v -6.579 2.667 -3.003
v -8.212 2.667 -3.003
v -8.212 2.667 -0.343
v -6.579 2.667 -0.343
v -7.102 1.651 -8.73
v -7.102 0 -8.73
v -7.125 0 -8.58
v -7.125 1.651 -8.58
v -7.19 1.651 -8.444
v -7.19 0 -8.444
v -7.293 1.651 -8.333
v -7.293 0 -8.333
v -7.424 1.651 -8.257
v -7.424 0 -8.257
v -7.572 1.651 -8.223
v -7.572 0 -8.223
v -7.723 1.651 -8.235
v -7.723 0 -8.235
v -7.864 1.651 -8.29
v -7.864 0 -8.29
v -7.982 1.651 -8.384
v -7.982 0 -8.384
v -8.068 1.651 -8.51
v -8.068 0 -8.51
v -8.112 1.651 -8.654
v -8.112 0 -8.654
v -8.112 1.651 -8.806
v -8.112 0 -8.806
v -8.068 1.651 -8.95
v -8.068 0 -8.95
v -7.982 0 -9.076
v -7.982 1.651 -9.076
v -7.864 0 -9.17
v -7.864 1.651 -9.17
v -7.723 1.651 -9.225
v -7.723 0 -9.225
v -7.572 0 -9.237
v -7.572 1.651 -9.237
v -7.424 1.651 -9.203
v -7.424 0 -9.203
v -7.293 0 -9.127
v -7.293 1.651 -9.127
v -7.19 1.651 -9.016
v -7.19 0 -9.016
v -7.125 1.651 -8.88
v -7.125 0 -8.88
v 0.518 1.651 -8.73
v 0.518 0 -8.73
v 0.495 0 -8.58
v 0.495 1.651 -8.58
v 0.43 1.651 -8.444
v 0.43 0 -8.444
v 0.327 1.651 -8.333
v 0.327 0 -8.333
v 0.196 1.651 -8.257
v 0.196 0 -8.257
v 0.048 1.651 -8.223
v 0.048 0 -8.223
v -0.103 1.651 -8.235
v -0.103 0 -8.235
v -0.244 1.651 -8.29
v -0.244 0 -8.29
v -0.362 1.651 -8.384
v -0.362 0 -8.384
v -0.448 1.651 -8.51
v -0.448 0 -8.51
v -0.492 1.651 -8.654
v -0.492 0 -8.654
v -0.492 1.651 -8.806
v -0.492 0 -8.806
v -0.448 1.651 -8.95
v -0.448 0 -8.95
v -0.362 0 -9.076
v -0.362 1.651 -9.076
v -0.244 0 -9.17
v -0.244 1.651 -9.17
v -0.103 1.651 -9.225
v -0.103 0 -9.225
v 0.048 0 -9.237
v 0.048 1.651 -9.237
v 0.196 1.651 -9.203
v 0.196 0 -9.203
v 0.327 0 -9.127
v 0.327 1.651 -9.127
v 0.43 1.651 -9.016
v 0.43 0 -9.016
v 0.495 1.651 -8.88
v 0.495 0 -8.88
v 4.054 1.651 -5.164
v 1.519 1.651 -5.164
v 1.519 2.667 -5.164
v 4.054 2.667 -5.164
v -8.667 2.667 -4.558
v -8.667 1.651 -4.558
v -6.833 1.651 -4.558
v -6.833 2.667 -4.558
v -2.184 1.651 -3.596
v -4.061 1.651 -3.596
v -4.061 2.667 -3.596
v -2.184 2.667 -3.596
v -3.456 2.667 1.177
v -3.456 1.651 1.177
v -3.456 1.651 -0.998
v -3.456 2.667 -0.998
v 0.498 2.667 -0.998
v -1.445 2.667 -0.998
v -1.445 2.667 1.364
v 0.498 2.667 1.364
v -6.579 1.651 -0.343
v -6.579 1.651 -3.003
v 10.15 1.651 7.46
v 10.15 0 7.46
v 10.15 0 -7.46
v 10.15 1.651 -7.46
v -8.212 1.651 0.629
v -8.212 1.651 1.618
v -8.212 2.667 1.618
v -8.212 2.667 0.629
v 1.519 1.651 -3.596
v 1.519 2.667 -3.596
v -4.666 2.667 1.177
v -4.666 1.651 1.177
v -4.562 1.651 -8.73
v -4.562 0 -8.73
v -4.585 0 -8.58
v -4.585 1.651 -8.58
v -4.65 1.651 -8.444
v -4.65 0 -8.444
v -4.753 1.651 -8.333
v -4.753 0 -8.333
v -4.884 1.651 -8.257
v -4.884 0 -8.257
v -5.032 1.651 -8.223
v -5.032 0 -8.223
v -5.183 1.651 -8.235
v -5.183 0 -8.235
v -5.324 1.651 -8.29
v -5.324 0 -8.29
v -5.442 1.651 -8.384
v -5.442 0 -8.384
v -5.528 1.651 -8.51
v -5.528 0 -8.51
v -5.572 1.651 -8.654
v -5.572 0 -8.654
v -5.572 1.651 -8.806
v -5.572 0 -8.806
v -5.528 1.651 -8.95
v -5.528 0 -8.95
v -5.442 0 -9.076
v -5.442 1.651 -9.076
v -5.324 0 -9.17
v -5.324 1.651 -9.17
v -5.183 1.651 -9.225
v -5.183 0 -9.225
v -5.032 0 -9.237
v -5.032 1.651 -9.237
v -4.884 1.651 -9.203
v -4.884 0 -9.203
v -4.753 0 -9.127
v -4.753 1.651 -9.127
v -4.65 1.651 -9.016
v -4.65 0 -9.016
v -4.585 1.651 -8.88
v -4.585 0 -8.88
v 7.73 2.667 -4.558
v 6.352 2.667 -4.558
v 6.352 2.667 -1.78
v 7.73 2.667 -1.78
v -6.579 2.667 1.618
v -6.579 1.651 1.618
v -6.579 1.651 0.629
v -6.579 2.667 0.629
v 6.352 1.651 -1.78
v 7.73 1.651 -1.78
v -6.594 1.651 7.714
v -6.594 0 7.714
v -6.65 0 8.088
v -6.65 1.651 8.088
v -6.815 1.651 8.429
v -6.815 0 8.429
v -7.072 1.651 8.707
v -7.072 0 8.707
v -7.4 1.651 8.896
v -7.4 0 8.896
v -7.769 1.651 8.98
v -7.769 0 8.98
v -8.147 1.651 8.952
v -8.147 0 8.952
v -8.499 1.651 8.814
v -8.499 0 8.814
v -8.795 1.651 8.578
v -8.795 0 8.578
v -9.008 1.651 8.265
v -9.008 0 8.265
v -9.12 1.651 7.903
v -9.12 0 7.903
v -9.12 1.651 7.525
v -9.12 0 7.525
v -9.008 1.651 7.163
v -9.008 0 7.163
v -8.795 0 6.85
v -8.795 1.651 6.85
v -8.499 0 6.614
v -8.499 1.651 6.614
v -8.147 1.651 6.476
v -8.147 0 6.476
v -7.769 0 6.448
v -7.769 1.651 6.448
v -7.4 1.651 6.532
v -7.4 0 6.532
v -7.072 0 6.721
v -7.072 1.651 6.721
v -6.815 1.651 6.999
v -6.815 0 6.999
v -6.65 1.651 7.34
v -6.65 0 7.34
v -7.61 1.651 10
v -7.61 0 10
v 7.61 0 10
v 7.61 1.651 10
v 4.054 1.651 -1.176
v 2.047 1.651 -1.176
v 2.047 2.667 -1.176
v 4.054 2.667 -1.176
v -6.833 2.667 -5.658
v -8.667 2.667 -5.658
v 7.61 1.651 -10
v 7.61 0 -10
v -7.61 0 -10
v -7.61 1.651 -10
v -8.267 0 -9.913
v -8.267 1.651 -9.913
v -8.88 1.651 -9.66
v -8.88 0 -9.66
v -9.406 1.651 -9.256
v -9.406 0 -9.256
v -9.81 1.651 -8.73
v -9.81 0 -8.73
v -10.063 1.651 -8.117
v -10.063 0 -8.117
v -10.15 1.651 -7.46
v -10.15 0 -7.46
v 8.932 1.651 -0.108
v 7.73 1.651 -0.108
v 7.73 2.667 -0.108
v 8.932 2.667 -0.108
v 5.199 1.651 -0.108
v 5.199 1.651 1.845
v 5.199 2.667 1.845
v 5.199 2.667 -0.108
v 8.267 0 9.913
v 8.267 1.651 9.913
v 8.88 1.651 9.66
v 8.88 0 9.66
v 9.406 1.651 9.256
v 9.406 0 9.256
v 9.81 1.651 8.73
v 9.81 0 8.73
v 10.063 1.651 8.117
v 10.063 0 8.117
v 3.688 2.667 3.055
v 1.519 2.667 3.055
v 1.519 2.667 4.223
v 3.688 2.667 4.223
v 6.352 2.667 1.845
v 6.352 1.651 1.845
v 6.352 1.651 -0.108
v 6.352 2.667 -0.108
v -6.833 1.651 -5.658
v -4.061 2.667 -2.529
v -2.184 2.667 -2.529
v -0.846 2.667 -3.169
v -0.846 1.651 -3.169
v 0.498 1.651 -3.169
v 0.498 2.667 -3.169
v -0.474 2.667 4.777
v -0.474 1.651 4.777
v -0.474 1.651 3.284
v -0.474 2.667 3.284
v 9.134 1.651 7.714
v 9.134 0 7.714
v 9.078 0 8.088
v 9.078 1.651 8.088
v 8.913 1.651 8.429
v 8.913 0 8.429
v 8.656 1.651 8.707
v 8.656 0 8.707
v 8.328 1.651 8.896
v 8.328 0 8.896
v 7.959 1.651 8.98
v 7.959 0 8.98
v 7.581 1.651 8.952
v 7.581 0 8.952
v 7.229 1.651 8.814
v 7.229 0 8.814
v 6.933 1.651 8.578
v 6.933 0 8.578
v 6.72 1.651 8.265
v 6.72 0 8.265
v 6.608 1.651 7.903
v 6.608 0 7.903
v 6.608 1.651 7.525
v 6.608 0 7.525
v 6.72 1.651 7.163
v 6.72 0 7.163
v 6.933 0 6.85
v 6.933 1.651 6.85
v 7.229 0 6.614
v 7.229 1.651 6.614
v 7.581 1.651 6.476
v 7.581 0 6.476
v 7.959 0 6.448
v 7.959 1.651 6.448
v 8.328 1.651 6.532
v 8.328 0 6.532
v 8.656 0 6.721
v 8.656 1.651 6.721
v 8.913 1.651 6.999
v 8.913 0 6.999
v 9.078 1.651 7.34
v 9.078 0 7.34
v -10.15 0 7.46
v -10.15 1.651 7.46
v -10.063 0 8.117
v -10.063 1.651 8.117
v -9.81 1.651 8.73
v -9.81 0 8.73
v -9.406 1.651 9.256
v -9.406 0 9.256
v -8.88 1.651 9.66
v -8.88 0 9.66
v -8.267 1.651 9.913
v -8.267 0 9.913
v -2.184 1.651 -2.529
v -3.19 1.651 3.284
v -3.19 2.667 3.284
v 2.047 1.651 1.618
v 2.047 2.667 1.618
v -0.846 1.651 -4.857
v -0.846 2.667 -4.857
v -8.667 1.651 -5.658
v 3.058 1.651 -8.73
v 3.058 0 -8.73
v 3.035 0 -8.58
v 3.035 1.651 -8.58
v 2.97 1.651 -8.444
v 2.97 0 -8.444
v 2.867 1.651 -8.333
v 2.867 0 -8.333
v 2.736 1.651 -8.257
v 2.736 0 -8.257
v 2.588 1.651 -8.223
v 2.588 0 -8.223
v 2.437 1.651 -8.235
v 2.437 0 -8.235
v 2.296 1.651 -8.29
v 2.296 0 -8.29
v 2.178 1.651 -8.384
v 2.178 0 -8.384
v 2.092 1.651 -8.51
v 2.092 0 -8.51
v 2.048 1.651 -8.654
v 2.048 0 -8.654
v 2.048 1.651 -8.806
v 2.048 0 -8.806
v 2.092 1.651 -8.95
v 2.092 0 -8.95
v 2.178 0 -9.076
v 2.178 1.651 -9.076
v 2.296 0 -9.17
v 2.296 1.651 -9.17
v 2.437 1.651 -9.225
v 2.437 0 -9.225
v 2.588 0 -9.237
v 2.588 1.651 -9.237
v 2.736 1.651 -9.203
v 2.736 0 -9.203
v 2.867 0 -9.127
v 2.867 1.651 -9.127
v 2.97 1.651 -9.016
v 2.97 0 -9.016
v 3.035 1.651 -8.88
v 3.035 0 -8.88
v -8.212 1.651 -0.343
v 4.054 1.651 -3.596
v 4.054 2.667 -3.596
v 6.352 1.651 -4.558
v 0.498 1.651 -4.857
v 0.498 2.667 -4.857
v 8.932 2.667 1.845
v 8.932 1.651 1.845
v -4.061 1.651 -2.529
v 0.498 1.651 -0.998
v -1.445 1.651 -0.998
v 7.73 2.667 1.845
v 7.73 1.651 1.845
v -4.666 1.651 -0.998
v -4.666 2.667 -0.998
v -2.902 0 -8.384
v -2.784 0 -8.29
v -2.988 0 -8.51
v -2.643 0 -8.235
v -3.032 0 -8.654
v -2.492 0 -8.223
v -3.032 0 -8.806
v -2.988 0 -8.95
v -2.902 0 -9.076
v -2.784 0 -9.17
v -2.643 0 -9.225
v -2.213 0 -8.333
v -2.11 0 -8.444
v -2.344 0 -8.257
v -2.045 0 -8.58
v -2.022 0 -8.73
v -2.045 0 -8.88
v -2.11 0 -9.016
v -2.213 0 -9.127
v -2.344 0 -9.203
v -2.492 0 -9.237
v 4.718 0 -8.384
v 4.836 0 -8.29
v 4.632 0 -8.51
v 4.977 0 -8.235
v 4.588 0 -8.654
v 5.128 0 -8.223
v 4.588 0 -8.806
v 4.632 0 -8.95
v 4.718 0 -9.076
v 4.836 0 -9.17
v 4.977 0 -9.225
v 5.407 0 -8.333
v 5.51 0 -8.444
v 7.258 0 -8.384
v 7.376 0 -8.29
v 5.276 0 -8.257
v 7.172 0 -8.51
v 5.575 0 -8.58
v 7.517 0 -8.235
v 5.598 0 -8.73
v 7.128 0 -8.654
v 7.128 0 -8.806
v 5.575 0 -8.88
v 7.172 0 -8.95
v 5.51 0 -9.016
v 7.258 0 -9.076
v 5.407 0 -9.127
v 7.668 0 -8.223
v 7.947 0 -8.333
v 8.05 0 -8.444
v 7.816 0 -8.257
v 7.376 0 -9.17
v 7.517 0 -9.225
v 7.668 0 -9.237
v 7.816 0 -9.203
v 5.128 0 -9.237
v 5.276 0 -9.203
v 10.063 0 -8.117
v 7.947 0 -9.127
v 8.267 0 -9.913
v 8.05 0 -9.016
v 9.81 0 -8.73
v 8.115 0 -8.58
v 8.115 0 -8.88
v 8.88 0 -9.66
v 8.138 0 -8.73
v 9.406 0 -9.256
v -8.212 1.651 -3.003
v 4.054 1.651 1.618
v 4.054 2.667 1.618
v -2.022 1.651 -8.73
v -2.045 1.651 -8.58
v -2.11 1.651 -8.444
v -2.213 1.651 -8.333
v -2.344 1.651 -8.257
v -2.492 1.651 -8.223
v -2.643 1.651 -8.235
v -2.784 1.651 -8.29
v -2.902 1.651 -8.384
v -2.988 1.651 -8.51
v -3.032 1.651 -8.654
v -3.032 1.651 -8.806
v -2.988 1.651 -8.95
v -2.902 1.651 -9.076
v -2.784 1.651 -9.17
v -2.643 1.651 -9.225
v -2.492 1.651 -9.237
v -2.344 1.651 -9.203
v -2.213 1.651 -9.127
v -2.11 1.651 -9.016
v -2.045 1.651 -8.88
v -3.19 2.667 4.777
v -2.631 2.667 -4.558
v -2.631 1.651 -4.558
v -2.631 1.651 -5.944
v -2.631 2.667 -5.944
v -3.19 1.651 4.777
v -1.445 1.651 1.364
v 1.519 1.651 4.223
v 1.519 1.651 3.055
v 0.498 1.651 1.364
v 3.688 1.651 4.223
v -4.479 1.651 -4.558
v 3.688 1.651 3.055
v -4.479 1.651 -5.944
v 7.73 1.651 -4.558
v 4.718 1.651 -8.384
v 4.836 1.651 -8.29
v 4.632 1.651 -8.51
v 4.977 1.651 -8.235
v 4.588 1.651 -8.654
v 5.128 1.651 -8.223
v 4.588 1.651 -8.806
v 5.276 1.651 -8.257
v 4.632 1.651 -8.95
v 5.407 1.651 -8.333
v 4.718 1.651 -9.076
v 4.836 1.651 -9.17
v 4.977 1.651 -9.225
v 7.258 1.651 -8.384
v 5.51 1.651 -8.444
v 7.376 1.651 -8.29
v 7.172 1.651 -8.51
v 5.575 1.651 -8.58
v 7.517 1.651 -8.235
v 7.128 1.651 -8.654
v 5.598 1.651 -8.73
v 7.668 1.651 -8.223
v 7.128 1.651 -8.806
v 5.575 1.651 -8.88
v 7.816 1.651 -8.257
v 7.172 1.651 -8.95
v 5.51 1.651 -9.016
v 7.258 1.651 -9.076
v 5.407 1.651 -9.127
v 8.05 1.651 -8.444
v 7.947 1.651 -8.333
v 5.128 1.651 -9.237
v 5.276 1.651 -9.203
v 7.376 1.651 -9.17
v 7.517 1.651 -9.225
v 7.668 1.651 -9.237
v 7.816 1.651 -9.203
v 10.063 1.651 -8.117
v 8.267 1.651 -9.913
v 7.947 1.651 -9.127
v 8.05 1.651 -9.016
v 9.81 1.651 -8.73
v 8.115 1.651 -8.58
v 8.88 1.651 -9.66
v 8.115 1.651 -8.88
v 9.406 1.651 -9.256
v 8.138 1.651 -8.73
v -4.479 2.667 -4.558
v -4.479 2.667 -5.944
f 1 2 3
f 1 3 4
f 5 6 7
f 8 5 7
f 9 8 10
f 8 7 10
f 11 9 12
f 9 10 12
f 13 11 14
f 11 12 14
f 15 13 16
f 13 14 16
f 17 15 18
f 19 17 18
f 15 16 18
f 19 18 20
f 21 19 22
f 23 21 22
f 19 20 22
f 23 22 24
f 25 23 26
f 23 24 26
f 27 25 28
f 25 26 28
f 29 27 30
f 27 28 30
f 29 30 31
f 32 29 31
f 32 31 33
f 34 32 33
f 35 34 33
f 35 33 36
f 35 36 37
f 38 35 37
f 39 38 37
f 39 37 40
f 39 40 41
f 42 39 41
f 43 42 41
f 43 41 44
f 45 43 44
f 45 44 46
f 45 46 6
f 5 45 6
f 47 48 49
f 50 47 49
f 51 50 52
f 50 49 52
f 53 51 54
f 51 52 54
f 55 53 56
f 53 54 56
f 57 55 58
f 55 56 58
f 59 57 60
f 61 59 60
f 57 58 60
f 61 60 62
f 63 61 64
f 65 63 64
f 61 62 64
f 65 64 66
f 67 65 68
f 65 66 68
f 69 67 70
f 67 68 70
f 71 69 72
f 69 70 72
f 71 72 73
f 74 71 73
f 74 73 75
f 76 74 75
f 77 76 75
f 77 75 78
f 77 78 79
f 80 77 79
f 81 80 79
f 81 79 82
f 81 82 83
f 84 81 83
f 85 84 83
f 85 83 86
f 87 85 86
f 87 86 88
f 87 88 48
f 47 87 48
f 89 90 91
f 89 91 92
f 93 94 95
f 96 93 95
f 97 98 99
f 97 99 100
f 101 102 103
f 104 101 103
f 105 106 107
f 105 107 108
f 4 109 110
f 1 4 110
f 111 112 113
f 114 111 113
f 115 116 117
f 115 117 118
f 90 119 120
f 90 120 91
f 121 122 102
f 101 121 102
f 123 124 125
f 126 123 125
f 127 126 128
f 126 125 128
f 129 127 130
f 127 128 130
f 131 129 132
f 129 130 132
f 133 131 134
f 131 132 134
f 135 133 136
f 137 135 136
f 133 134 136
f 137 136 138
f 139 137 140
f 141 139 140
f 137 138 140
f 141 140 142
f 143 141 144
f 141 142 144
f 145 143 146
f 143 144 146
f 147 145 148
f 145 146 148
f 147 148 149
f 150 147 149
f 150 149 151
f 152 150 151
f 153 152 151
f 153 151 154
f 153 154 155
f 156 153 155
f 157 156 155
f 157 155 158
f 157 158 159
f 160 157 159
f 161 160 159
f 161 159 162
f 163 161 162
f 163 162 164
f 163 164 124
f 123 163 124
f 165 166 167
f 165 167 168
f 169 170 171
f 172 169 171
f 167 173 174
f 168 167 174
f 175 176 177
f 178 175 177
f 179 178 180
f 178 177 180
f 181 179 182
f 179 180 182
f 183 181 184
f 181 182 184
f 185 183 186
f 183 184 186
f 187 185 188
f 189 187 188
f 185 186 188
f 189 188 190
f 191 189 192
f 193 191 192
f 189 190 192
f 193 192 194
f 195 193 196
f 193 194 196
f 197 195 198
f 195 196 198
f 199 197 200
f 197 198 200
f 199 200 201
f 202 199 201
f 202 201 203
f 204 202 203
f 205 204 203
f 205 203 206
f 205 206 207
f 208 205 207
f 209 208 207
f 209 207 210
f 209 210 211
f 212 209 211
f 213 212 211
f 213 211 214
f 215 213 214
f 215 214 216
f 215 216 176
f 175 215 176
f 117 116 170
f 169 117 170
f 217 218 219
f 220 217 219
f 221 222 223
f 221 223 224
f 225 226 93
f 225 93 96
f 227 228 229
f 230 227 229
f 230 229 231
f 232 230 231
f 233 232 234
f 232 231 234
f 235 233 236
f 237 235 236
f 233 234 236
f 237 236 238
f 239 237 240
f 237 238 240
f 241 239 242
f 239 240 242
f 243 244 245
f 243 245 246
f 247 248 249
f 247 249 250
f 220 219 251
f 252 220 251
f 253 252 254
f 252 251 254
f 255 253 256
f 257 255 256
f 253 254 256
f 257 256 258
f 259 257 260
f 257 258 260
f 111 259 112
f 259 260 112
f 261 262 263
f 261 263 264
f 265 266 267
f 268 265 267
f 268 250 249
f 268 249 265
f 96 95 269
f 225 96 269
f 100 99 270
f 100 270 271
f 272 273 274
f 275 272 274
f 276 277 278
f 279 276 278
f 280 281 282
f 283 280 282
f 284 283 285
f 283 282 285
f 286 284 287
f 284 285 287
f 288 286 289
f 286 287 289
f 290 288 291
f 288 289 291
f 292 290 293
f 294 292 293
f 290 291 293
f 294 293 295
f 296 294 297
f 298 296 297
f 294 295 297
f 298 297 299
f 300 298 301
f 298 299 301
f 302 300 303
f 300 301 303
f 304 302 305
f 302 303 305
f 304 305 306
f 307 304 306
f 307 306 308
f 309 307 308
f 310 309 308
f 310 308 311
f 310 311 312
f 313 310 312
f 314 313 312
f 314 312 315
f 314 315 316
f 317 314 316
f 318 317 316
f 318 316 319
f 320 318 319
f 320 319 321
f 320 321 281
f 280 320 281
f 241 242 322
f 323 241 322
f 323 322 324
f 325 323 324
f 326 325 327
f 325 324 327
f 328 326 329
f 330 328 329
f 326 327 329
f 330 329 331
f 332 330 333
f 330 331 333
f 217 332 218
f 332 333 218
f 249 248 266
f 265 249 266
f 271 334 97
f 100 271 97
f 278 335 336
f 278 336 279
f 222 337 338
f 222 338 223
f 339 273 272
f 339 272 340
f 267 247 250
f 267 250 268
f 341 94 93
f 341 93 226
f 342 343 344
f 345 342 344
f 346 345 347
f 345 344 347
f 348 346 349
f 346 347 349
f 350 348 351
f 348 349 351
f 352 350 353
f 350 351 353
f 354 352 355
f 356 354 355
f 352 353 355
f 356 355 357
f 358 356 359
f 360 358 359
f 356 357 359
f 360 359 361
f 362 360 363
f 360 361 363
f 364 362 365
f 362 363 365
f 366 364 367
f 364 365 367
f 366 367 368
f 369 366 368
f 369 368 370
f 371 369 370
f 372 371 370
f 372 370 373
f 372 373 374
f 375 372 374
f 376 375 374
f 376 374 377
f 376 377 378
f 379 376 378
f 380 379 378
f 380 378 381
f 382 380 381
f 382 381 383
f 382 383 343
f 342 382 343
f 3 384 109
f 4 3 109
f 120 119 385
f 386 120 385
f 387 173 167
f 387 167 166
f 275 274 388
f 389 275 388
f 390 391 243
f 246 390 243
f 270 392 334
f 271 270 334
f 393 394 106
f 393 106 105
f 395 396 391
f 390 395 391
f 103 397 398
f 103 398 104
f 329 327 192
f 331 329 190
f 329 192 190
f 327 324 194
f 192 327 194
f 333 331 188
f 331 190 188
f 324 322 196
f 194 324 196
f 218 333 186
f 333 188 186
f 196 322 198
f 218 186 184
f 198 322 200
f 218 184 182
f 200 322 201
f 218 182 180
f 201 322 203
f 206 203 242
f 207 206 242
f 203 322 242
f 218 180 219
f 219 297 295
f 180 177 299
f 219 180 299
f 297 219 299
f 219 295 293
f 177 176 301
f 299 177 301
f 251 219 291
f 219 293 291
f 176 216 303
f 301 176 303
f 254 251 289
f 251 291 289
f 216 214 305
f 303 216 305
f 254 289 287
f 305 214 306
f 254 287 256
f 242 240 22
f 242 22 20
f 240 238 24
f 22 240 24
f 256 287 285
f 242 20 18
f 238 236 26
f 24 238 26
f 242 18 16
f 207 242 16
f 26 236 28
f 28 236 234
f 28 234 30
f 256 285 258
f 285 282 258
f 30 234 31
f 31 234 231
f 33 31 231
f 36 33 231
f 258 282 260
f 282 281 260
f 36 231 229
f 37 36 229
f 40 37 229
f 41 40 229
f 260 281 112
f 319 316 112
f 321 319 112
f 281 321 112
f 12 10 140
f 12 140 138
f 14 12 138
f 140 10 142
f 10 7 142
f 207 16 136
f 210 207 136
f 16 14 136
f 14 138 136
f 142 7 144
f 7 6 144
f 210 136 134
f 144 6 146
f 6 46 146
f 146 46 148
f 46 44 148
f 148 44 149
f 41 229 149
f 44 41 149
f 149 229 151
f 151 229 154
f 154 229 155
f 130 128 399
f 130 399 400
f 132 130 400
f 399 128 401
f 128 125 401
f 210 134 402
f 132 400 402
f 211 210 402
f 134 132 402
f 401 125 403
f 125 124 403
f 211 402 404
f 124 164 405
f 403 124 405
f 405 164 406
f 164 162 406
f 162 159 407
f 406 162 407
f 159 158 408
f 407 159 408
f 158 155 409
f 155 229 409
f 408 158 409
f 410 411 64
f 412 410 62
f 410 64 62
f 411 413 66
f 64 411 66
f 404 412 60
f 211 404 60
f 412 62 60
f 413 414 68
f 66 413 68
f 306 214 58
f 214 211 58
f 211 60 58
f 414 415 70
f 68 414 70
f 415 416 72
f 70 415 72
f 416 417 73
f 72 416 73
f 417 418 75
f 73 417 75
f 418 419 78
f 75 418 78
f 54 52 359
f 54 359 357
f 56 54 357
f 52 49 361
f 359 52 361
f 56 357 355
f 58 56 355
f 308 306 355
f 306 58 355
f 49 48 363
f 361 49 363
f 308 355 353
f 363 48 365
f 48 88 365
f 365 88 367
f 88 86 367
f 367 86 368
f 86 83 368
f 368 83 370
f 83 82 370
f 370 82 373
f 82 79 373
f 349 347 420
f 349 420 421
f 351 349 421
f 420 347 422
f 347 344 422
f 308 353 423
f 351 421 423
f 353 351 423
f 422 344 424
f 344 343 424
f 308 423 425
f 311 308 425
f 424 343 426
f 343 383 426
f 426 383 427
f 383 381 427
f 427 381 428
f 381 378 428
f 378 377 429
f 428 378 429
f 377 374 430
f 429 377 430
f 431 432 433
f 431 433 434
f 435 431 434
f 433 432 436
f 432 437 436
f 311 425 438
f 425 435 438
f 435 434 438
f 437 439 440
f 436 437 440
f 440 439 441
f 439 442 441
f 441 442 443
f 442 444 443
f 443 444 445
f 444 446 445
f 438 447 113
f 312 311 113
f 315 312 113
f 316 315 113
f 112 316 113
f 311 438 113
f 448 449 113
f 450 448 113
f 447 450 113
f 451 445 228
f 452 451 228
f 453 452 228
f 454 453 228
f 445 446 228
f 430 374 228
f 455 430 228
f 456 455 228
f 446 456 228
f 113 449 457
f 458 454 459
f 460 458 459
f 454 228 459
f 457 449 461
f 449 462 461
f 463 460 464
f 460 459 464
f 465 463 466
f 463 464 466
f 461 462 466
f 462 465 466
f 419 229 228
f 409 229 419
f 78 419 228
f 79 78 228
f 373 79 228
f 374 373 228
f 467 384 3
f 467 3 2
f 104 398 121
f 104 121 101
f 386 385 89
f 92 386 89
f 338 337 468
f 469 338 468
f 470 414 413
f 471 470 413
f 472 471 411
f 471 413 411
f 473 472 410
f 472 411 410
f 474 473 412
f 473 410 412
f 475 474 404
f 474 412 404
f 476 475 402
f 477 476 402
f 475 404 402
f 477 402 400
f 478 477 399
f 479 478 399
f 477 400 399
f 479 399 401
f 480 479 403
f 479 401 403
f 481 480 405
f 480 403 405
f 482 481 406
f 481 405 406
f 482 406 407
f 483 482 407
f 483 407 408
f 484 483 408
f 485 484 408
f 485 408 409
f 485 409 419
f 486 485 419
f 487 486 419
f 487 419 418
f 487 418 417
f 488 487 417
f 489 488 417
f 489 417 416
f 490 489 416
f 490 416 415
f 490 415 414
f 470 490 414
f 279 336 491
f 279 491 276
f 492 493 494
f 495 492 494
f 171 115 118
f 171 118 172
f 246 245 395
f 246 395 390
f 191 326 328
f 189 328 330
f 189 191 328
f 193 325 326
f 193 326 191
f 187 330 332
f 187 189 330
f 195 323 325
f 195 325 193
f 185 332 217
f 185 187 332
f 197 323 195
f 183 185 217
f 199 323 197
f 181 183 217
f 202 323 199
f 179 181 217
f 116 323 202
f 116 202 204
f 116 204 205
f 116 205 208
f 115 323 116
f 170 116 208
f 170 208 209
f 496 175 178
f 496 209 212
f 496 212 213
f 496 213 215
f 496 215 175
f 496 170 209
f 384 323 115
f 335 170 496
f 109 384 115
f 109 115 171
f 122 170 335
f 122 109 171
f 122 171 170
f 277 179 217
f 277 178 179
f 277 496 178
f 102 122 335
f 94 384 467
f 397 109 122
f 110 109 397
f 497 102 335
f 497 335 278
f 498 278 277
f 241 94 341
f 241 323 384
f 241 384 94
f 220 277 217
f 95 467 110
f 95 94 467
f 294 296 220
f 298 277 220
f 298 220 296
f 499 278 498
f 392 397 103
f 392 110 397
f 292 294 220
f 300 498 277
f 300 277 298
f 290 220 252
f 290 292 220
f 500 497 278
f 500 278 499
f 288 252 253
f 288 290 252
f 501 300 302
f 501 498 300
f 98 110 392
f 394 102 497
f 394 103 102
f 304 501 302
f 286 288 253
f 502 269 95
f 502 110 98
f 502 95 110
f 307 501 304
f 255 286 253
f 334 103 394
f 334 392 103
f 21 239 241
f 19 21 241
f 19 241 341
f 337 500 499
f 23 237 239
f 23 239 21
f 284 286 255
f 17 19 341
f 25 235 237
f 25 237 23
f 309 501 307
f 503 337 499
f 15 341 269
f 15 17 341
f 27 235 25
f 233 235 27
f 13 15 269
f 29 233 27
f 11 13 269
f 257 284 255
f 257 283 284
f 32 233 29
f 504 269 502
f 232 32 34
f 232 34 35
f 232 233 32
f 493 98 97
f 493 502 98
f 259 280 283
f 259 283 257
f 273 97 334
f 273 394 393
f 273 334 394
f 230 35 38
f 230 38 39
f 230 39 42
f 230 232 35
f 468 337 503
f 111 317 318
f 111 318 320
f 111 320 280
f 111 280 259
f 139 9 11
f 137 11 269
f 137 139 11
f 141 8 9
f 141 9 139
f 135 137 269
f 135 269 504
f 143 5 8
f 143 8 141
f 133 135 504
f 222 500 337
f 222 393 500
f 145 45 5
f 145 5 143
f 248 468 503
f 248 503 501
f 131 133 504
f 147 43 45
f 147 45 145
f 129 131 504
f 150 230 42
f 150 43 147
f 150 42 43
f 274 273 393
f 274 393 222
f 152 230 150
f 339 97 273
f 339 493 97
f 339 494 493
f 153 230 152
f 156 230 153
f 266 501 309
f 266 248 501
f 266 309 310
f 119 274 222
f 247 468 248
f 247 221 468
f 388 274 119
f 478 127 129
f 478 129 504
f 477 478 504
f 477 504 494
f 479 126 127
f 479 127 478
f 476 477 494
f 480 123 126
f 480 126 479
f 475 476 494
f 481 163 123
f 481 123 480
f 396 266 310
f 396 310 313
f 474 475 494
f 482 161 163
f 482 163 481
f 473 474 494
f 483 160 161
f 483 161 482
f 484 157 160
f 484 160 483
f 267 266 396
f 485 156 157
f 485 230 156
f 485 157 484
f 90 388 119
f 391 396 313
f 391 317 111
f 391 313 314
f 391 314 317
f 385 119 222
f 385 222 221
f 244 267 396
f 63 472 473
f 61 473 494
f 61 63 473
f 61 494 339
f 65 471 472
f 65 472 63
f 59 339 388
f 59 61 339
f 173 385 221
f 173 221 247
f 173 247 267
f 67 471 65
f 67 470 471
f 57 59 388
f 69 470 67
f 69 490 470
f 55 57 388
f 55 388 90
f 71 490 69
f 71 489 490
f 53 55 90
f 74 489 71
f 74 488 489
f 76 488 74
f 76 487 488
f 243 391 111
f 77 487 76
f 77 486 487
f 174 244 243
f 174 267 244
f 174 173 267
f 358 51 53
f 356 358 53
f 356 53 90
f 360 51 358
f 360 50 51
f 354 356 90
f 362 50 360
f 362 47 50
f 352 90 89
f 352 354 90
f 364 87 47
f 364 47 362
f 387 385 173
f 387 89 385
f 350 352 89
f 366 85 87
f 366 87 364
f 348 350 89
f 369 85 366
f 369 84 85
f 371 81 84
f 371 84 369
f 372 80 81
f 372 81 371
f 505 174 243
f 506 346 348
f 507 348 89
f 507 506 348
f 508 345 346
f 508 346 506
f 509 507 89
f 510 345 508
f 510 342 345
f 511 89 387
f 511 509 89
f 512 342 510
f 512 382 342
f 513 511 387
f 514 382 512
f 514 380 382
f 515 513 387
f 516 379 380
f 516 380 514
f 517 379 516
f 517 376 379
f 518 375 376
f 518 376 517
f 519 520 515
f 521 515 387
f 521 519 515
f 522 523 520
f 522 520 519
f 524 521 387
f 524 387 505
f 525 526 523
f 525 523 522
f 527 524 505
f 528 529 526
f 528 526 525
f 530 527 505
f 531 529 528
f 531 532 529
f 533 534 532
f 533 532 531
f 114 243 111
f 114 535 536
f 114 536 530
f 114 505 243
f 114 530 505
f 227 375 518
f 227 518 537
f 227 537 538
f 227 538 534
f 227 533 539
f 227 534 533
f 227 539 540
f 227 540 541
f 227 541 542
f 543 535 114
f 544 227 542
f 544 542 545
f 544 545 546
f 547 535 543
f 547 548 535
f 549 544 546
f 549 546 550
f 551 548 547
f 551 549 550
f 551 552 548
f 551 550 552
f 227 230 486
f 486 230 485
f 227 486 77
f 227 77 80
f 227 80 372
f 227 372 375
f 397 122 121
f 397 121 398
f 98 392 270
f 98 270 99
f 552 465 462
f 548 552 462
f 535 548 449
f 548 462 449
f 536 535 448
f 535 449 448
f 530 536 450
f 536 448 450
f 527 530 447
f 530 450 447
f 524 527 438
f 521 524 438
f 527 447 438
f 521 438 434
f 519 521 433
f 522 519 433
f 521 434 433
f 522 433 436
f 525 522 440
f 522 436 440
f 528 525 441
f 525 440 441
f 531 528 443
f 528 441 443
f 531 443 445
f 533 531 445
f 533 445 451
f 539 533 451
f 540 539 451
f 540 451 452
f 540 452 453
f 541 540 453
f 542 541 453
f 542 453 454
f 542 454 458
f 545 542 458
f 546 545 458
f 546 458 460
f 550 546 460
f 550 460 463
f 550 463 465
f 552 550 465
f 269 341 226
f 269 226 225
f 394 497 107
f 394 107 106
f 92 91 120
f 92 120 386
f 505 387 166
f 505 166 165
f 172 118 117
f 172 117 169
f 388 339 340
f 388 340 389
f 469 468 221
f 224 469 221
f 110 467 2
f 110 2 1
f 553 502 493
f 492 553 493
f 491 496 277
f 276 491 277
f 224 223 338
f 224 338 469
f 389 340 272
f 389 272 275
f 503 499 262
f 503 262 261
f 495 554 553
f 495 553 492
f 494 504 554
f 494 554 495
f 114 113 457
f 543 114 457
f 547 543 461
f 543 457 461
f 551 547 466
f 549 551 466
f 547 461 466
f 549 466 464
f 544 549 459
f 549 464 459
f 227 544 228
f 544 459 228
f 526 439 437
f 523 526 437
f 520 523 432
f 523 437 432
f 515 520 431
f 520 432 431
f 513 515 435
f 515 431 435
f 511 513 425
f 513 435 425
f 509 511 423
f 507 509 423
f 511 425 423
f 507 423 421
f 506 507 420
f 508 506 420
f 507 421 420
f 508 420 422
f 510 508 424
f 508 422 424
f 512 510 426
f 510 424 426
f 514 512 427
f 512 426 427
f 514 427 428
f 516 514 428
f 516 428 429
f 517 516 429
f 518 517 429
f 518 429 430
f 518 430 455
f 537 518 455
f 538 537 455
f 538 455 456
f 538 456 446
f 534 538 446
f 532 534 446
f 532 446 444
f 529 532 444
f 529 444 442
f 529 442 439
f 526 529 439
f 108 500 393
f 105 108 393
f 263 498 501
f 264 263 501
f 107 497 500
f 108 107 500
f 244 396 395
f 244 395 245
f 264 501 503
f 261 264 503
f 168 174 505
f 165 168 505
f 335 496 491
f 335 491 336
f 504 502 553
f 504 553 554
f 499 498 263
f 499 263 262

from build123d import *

# Parameters (mm, degrees)
PCB_DEPTH          = 1.651
SKETCH2_R          = 1.27
SKETCH2_R_2        = 0.508
CUT_EXTRUDE1_DEPTH = 2.651
SKETCH3_W          = 1.9431
SKETCH3_H          = 2.3622
SKETCH3_W_2        = 2.0066
SKETCH3_H_2        = 2.794
SKETCH3_W_3        = 2.16822249
SKETCH3_H_3        = 1.167787324
SKETCH3_W_4        = 2.716171955
SKETCH3_H_4        = 1.493517176
SKETCH3_W_5        = 1.209663862
SKETCH3_H_5        = 2.17508788
SKETCH3_W_6        = 1.633321627
SKETCH3_H_6        = 2.659890245
SKETCH3_W_7        = 1.834361491
SKETCH3_H_7        = 1.100221283
SKETCH3_W_8        = 1.848311781
SKETCH3_H_8        = 1.38602823
SKETCH3_W_9        = 1.877433771
SKETCH3_H_9        = 1.066217503
SKETCH3_H_10       = 0.988618516
SKETCH3_W_10       = 1.152895283
SKETCH3_H_11       = 1.952725423
SKETCH3_W_11       = 1.201658639
SKETCH3_W_12       = 1.378437796
SKETCH3_H_12       = 2.778082819
SKETCH3_W_13       = 2.534678464
SKETCH3_H_13       = 1.568516227
SKETCH3_W_14       = 1.344087022
SKETCH3_H_14       = 1.688234225
COMPONENTS_DEPTH   = 1.016


with BuildPart() as part:
    # Sketch1 → pcb (new body)
    with BuildSketch(Plane(origin=(0, 0, 0), x_dir=(1, 0, 0), z_dir=(0, 1, 0))):
        with BuildLine():
            Line((-7.61, -10), (7.61, -10))
            ThreePointArc((7.61, -10), (9.406051224, -9.256051224), (10.15, -7.46))
            Line((10.15, -7.46), (10.15, 7.46))
            ThreePointArc((10.15, 7.46), (9.406051224, 9.256051224), (7.61, 10))
            Line((7.61, 10), (-7.61, 10))
            ThreePointArc((-7.61, 10), (-9.406051224, 9.256051224), (-10.15, 7.46))
            Line((-10.15, 7.46), (-10.15, -7.46))
            ThreePointArc((-10.15, -7.46), (-9.406051224, -9.256051224), (-7.61, -10))
        make_face()
    extrude(amount=PCB_DEPTH)

    # Sketch2 → Cut-Extrude1 (cut, through all)
    with BuildSketch(Plane.XZ):
        with Locations((-7.864, 7.714)):
            Circle(SKETCH2_R)
        with Locations((7.864, 7.714)):
            Circle(SKETCH2_R)
        with Locations((-7.61, -8.73)):
            Circle(SKETCH2_R_2)
        with Locations((-5.07, -8.73)):
            Circle(SKETCH2_R_2)
        with Locations((-2.53, -8.73)):
            Circle(SKETCH2_R_2)
        with Locations((0.01, -8.73)):
            Circle(SKETCH2_R_2)
        with Locations((2.55, -8.73)):
            Circle(SKETCH2_R_2)
        with Locations((5.09, -8.73)):
            Circle(SKETCH2_R_2)
        with Locations((7.63, -8.73)):
            Circle(SKETCH2_R_2)
    extrude(amount=-CUT_EXTRUDE1_DEPTH, mode=Mode.SUBTRACT)

    # Sketch3 → components (add)
    with BuildSketch(Plane(origin=(0, 1.651, 0), x_dir=(1, 0, 0), z_dir=(0, 1, 0))):
        with Locations((-0.47355, -0.1829)):
            Rectangle(SKETCH3_W, SKETCH3_H)
        with Locations((3.0507, -0.221)):
            Rectangle(SKETCH3_W_2, SKETCH3_H_2)
        with Locations((2.603432781, -3.639116092)):
            Rectangle(SKETCH3_W_3, SKETCH3_H_3)
        with Locations((-1.831635977, -4.030732119)):
            Rectangle(SKETCH3_W_4, SKETCH3_H_4)
        with Locations((-4.061190046, -0.08934394)):
            Rectangle(SKETCH3_W_5, SKETCH3_H_5)
        with Locations((-7.395465276, 1.673424229)):
            Rectangle(SKETCH3_W_6, SKETCH3_H_6)
        with Locations((-7.750024191, 5.108202568)):
            Rectangle(SKETCH3_W_7, SKETCH3_H_7)
        with Locations((-3.555135742, 5.251106041)):
            Rectangle(SKETCH3_W_8, SKETCH3_H_8)
        with Locations((-3.122473161, 3.062543074)):
            Rectangle(SKETCH3_W_9, SKETCH3_H_9)
        with Locations((-7.395465276, -1.123690742)):
            Rectangle(SKETCH3_W_6, SKETCH3_H_10)
        with Locations((5.77539067, -0.868377737)):
            Rectangle(SKETCH3_W_10, SKETCH3_H_11)
        with Locations((8.331105427, -0.868377737)):
            Rectangle(SKETCH3_W_11, SKETCH3_H_11)
        with Locations((7.041057209, 3.169050517)):
            Rectangle(SKETCH3_W_12, SKETCH3_H_12)
        with Locations((2.786660768, 4.379909938)):
            Rectangle(SKETCH3_W_13, SKETCH3_H_13)
        with Locations((-0.174043511, 4.013167629)):
            Rectangle(SKETCH3_W_14, SKETCH3_H_14)
    extrude(amount=COMPONENTS_DEPTH)


solid = part.part
